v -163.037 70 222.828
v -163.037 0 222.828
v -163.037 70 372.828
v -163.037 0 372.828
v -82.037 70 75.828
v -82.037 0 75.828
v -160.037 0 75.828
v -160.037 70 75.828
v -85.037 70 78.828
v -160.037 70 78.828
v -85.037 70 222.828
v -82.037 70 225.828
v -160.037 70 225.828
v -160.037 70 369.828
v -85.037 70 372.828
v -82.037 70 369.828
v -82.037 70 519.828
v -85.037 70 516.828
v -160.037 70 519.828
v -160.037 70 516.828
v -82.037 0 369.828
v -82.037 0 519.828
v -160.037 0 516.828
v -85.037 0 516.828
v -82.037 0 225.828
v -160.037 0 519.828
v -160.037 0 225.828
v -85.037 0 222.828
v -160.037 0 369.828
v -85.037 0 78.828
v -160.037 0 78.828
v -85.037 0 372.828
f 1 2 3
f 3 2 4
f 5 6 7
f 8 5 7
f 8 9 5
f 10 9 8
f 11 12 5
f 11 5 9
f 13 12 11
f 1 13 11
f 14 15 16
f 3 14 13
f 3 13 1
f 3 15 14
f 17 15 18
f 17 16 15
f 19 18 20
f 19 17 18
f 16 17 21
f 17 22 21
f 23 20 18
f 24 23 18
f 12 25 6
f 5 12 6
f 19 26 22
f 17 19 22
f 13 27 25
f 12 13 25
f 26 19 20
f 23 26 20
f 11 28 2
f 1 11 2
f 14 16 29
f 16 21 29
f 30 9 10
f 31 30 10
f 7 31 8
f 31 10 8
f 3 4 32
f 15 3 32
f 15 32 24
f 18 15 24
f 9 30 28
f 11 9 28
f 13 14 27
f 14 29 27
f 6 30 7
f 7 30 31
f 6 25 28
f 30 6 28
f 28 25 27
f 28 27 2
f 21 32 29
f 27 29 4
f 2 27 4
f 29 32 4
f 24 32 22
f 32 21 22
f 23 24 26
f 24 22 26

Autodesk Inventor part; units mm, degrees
ref_plane "YZ Plane" through (0, 0, 0) normal (1, 0, 0) x (0, 1, 0)
ref_plane "XZ Plane" through (0, 0, 0) normal (0, 1, 0) x (-1, 0, 0)
ref_plane "XY Plane" through (0, 0, 0) normal (0, 0, 1) x (1, 0, 0)
sketch "スケッチ1" plane through (0, 0, 0) normal (0, 1, 0) x (-1, 0, 0)
  line L0 (85.0374, 519.8276) -> (82.0374, 519.8276)
  line L1 (82.0374, 519.8276) -> (82.0374, 369.8276)
  line L2 (82.0374, 369.8276) -> (85.0374, 369.8276)
  line L3 (85.0374, 369.8276) -> (85.0374, 519.8276)
  line L4 (160.0374, 372.8276) -> (85.0374, 372.8276)
  line L5 (85.0374, 372.8276) -> (85.0374, 369.8276)
  line L6 (85.0374, 369.8276) -> (160.0374, 369.8276)
  line L7 (160.0374, 369.8276) -> (160.0374, 372.8276)
  line L8 (163.0374, 372.8276) -> (160.0374, 372.8276)
  line L9 (160.0374, 372.8276) -> (160.0374, 222.8276)
  line L10 (160.0374, 222.8276) -> (163.0374, 222.8276)
  line L11 (163.0374, 222.8276) -> (163.0374, 372.8276)
  line L12 (160.0374, 225.8276) -> (85.0374, 225.8276)
  line L13 (85.0374, 225.8276) -> (85.0374, 222.8276)
  line L14 (85.0374, 222.8276) -> (160.0374, 222.8276)
  line L15 (160.0374, 222.8276) -> (160.0374, 225.8276)
  line L16 (85.0374, 225.8276) -> (82.0374, 225.8276)
  line L17 (82.0374, 225.8276) -> (82.0374, 75.8276)
  line L18 (82.0374, 75.8276) -> (85.0374, 75.8276)
  line L19 (85.0374, 75.8276) -> (85.0374, 225.8276)
  point P0 (0, 0)
  dimension "d0" = 150
  dimension "d1" = 3
  dimension "d2" = 3
  dimension "d3" = 75
  dimension "d4" = 3
  dimension "d5" = 150
  dimension "d6" = 75
  dimension "d7" = 3
  dimension "d8" = 3
  dimension "d9" = 150
extrude "押し出し1" add sketch "スケッチ1" along normal blind 70
sketch "スケッチ2" plane through (-82.0374, 0, 519.8276) normal (1, 0, 0) x (0, 0, -1)
  point P0 (519.8276, 0)
sketch "スケッチ3" plane through (0, 70, 0) normal (0, 1, 0) x (1, 0, 0)
  line L0 (-160.0374, -516.8276) -> (-85.0374, -516.8276)
  line L1 (-85.0374, -516.8276) -> (-85.0374, -519.8276)
  line L2 (-85.0374, -519.8276) -> (-160.0374, -519.8276)
  line L3 (-160.0374, -519.8276) -> (-160.0374, -516.8276)
  line L4 (-85.0374, -372.8276) -> (-85.0374, -519.8276) projected
  line L5 (-85.0374, -519.8276) -> (-82.0374, -519.8276) projected
  line L6 (-160.0374, -75.8276) -> (-85.0374, -75.8276)
  line L7 (-85.0374, -75.8276) -> (-85.0374, -78.8276)
  line L8 (-85.0374, -78.8276) -> (-160.0374, -78.8276)
  line L9 (-160.0374, -78.8276) -> (-160.0374, -75.8276)
  line L10 (-85.0374, -75.8276) -> (-85.0374, -222.8276) projected
  line L11 (-82.0374, -75.8276) -> (-85.0374, -75.8276) projected
  point P0 (0, 0)
  dimension "d12" = 75
  dimension "d13" = 3
  dimension "d14" = 75
  dimension "d15" = 3
extrude "押し出し2" add sketch "スケッチ3" against normal blind 70
properties part number "recreat2"
